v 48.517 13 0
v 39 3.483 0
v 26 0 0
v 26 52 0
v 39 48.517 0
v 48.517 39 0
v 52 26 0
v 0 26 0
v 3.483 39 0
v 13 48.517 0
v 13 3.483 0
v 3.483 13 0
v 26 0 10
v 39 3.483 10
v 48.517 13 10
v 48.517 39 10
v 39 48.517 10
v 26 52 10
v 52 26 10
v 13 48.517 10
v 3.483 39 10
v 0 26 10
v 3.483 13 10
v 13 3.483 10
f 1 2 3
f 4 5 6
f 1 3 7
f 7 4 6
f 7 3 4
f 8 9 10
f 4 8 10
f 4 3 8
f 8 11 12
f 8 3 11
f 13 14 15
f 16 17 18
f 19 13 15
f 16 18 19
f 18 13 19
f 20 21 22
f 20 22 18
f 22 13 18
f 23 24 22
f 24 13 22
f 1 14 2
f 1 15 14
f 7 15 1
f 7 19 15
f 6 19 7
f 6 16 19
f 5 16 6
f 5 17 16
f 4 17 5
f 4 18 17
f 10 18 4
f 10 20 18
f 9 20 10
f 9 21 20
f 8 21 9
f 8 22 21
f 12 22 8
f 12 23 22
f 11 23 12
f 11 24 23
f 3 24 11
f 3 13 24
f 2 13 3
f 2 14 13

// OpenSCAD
$fn = 32;

// ----------------------------------------------------------------------
// Flat adaptor: keyed, 10 mm thick
// ----------------------------------------------------------------------

// --- parameters (mm) ---
profile_height = 10;      // extrusion height
profile_points = 12;      // points of the closed outline

profile = [[0, 26], [3.483, 13], [13, 3.483], [26, 0], [39, 3.483], [48.517, 13], [52, 26], [48.517, 39], [39, 48.517], [26, 52], [13, 48.517], [3.483, 39]];  // single closed polygon, 12 points, counter clockwise

// --- the one profile operation ---
linear_extrude(height = profile_height) polygon(points = profile);
